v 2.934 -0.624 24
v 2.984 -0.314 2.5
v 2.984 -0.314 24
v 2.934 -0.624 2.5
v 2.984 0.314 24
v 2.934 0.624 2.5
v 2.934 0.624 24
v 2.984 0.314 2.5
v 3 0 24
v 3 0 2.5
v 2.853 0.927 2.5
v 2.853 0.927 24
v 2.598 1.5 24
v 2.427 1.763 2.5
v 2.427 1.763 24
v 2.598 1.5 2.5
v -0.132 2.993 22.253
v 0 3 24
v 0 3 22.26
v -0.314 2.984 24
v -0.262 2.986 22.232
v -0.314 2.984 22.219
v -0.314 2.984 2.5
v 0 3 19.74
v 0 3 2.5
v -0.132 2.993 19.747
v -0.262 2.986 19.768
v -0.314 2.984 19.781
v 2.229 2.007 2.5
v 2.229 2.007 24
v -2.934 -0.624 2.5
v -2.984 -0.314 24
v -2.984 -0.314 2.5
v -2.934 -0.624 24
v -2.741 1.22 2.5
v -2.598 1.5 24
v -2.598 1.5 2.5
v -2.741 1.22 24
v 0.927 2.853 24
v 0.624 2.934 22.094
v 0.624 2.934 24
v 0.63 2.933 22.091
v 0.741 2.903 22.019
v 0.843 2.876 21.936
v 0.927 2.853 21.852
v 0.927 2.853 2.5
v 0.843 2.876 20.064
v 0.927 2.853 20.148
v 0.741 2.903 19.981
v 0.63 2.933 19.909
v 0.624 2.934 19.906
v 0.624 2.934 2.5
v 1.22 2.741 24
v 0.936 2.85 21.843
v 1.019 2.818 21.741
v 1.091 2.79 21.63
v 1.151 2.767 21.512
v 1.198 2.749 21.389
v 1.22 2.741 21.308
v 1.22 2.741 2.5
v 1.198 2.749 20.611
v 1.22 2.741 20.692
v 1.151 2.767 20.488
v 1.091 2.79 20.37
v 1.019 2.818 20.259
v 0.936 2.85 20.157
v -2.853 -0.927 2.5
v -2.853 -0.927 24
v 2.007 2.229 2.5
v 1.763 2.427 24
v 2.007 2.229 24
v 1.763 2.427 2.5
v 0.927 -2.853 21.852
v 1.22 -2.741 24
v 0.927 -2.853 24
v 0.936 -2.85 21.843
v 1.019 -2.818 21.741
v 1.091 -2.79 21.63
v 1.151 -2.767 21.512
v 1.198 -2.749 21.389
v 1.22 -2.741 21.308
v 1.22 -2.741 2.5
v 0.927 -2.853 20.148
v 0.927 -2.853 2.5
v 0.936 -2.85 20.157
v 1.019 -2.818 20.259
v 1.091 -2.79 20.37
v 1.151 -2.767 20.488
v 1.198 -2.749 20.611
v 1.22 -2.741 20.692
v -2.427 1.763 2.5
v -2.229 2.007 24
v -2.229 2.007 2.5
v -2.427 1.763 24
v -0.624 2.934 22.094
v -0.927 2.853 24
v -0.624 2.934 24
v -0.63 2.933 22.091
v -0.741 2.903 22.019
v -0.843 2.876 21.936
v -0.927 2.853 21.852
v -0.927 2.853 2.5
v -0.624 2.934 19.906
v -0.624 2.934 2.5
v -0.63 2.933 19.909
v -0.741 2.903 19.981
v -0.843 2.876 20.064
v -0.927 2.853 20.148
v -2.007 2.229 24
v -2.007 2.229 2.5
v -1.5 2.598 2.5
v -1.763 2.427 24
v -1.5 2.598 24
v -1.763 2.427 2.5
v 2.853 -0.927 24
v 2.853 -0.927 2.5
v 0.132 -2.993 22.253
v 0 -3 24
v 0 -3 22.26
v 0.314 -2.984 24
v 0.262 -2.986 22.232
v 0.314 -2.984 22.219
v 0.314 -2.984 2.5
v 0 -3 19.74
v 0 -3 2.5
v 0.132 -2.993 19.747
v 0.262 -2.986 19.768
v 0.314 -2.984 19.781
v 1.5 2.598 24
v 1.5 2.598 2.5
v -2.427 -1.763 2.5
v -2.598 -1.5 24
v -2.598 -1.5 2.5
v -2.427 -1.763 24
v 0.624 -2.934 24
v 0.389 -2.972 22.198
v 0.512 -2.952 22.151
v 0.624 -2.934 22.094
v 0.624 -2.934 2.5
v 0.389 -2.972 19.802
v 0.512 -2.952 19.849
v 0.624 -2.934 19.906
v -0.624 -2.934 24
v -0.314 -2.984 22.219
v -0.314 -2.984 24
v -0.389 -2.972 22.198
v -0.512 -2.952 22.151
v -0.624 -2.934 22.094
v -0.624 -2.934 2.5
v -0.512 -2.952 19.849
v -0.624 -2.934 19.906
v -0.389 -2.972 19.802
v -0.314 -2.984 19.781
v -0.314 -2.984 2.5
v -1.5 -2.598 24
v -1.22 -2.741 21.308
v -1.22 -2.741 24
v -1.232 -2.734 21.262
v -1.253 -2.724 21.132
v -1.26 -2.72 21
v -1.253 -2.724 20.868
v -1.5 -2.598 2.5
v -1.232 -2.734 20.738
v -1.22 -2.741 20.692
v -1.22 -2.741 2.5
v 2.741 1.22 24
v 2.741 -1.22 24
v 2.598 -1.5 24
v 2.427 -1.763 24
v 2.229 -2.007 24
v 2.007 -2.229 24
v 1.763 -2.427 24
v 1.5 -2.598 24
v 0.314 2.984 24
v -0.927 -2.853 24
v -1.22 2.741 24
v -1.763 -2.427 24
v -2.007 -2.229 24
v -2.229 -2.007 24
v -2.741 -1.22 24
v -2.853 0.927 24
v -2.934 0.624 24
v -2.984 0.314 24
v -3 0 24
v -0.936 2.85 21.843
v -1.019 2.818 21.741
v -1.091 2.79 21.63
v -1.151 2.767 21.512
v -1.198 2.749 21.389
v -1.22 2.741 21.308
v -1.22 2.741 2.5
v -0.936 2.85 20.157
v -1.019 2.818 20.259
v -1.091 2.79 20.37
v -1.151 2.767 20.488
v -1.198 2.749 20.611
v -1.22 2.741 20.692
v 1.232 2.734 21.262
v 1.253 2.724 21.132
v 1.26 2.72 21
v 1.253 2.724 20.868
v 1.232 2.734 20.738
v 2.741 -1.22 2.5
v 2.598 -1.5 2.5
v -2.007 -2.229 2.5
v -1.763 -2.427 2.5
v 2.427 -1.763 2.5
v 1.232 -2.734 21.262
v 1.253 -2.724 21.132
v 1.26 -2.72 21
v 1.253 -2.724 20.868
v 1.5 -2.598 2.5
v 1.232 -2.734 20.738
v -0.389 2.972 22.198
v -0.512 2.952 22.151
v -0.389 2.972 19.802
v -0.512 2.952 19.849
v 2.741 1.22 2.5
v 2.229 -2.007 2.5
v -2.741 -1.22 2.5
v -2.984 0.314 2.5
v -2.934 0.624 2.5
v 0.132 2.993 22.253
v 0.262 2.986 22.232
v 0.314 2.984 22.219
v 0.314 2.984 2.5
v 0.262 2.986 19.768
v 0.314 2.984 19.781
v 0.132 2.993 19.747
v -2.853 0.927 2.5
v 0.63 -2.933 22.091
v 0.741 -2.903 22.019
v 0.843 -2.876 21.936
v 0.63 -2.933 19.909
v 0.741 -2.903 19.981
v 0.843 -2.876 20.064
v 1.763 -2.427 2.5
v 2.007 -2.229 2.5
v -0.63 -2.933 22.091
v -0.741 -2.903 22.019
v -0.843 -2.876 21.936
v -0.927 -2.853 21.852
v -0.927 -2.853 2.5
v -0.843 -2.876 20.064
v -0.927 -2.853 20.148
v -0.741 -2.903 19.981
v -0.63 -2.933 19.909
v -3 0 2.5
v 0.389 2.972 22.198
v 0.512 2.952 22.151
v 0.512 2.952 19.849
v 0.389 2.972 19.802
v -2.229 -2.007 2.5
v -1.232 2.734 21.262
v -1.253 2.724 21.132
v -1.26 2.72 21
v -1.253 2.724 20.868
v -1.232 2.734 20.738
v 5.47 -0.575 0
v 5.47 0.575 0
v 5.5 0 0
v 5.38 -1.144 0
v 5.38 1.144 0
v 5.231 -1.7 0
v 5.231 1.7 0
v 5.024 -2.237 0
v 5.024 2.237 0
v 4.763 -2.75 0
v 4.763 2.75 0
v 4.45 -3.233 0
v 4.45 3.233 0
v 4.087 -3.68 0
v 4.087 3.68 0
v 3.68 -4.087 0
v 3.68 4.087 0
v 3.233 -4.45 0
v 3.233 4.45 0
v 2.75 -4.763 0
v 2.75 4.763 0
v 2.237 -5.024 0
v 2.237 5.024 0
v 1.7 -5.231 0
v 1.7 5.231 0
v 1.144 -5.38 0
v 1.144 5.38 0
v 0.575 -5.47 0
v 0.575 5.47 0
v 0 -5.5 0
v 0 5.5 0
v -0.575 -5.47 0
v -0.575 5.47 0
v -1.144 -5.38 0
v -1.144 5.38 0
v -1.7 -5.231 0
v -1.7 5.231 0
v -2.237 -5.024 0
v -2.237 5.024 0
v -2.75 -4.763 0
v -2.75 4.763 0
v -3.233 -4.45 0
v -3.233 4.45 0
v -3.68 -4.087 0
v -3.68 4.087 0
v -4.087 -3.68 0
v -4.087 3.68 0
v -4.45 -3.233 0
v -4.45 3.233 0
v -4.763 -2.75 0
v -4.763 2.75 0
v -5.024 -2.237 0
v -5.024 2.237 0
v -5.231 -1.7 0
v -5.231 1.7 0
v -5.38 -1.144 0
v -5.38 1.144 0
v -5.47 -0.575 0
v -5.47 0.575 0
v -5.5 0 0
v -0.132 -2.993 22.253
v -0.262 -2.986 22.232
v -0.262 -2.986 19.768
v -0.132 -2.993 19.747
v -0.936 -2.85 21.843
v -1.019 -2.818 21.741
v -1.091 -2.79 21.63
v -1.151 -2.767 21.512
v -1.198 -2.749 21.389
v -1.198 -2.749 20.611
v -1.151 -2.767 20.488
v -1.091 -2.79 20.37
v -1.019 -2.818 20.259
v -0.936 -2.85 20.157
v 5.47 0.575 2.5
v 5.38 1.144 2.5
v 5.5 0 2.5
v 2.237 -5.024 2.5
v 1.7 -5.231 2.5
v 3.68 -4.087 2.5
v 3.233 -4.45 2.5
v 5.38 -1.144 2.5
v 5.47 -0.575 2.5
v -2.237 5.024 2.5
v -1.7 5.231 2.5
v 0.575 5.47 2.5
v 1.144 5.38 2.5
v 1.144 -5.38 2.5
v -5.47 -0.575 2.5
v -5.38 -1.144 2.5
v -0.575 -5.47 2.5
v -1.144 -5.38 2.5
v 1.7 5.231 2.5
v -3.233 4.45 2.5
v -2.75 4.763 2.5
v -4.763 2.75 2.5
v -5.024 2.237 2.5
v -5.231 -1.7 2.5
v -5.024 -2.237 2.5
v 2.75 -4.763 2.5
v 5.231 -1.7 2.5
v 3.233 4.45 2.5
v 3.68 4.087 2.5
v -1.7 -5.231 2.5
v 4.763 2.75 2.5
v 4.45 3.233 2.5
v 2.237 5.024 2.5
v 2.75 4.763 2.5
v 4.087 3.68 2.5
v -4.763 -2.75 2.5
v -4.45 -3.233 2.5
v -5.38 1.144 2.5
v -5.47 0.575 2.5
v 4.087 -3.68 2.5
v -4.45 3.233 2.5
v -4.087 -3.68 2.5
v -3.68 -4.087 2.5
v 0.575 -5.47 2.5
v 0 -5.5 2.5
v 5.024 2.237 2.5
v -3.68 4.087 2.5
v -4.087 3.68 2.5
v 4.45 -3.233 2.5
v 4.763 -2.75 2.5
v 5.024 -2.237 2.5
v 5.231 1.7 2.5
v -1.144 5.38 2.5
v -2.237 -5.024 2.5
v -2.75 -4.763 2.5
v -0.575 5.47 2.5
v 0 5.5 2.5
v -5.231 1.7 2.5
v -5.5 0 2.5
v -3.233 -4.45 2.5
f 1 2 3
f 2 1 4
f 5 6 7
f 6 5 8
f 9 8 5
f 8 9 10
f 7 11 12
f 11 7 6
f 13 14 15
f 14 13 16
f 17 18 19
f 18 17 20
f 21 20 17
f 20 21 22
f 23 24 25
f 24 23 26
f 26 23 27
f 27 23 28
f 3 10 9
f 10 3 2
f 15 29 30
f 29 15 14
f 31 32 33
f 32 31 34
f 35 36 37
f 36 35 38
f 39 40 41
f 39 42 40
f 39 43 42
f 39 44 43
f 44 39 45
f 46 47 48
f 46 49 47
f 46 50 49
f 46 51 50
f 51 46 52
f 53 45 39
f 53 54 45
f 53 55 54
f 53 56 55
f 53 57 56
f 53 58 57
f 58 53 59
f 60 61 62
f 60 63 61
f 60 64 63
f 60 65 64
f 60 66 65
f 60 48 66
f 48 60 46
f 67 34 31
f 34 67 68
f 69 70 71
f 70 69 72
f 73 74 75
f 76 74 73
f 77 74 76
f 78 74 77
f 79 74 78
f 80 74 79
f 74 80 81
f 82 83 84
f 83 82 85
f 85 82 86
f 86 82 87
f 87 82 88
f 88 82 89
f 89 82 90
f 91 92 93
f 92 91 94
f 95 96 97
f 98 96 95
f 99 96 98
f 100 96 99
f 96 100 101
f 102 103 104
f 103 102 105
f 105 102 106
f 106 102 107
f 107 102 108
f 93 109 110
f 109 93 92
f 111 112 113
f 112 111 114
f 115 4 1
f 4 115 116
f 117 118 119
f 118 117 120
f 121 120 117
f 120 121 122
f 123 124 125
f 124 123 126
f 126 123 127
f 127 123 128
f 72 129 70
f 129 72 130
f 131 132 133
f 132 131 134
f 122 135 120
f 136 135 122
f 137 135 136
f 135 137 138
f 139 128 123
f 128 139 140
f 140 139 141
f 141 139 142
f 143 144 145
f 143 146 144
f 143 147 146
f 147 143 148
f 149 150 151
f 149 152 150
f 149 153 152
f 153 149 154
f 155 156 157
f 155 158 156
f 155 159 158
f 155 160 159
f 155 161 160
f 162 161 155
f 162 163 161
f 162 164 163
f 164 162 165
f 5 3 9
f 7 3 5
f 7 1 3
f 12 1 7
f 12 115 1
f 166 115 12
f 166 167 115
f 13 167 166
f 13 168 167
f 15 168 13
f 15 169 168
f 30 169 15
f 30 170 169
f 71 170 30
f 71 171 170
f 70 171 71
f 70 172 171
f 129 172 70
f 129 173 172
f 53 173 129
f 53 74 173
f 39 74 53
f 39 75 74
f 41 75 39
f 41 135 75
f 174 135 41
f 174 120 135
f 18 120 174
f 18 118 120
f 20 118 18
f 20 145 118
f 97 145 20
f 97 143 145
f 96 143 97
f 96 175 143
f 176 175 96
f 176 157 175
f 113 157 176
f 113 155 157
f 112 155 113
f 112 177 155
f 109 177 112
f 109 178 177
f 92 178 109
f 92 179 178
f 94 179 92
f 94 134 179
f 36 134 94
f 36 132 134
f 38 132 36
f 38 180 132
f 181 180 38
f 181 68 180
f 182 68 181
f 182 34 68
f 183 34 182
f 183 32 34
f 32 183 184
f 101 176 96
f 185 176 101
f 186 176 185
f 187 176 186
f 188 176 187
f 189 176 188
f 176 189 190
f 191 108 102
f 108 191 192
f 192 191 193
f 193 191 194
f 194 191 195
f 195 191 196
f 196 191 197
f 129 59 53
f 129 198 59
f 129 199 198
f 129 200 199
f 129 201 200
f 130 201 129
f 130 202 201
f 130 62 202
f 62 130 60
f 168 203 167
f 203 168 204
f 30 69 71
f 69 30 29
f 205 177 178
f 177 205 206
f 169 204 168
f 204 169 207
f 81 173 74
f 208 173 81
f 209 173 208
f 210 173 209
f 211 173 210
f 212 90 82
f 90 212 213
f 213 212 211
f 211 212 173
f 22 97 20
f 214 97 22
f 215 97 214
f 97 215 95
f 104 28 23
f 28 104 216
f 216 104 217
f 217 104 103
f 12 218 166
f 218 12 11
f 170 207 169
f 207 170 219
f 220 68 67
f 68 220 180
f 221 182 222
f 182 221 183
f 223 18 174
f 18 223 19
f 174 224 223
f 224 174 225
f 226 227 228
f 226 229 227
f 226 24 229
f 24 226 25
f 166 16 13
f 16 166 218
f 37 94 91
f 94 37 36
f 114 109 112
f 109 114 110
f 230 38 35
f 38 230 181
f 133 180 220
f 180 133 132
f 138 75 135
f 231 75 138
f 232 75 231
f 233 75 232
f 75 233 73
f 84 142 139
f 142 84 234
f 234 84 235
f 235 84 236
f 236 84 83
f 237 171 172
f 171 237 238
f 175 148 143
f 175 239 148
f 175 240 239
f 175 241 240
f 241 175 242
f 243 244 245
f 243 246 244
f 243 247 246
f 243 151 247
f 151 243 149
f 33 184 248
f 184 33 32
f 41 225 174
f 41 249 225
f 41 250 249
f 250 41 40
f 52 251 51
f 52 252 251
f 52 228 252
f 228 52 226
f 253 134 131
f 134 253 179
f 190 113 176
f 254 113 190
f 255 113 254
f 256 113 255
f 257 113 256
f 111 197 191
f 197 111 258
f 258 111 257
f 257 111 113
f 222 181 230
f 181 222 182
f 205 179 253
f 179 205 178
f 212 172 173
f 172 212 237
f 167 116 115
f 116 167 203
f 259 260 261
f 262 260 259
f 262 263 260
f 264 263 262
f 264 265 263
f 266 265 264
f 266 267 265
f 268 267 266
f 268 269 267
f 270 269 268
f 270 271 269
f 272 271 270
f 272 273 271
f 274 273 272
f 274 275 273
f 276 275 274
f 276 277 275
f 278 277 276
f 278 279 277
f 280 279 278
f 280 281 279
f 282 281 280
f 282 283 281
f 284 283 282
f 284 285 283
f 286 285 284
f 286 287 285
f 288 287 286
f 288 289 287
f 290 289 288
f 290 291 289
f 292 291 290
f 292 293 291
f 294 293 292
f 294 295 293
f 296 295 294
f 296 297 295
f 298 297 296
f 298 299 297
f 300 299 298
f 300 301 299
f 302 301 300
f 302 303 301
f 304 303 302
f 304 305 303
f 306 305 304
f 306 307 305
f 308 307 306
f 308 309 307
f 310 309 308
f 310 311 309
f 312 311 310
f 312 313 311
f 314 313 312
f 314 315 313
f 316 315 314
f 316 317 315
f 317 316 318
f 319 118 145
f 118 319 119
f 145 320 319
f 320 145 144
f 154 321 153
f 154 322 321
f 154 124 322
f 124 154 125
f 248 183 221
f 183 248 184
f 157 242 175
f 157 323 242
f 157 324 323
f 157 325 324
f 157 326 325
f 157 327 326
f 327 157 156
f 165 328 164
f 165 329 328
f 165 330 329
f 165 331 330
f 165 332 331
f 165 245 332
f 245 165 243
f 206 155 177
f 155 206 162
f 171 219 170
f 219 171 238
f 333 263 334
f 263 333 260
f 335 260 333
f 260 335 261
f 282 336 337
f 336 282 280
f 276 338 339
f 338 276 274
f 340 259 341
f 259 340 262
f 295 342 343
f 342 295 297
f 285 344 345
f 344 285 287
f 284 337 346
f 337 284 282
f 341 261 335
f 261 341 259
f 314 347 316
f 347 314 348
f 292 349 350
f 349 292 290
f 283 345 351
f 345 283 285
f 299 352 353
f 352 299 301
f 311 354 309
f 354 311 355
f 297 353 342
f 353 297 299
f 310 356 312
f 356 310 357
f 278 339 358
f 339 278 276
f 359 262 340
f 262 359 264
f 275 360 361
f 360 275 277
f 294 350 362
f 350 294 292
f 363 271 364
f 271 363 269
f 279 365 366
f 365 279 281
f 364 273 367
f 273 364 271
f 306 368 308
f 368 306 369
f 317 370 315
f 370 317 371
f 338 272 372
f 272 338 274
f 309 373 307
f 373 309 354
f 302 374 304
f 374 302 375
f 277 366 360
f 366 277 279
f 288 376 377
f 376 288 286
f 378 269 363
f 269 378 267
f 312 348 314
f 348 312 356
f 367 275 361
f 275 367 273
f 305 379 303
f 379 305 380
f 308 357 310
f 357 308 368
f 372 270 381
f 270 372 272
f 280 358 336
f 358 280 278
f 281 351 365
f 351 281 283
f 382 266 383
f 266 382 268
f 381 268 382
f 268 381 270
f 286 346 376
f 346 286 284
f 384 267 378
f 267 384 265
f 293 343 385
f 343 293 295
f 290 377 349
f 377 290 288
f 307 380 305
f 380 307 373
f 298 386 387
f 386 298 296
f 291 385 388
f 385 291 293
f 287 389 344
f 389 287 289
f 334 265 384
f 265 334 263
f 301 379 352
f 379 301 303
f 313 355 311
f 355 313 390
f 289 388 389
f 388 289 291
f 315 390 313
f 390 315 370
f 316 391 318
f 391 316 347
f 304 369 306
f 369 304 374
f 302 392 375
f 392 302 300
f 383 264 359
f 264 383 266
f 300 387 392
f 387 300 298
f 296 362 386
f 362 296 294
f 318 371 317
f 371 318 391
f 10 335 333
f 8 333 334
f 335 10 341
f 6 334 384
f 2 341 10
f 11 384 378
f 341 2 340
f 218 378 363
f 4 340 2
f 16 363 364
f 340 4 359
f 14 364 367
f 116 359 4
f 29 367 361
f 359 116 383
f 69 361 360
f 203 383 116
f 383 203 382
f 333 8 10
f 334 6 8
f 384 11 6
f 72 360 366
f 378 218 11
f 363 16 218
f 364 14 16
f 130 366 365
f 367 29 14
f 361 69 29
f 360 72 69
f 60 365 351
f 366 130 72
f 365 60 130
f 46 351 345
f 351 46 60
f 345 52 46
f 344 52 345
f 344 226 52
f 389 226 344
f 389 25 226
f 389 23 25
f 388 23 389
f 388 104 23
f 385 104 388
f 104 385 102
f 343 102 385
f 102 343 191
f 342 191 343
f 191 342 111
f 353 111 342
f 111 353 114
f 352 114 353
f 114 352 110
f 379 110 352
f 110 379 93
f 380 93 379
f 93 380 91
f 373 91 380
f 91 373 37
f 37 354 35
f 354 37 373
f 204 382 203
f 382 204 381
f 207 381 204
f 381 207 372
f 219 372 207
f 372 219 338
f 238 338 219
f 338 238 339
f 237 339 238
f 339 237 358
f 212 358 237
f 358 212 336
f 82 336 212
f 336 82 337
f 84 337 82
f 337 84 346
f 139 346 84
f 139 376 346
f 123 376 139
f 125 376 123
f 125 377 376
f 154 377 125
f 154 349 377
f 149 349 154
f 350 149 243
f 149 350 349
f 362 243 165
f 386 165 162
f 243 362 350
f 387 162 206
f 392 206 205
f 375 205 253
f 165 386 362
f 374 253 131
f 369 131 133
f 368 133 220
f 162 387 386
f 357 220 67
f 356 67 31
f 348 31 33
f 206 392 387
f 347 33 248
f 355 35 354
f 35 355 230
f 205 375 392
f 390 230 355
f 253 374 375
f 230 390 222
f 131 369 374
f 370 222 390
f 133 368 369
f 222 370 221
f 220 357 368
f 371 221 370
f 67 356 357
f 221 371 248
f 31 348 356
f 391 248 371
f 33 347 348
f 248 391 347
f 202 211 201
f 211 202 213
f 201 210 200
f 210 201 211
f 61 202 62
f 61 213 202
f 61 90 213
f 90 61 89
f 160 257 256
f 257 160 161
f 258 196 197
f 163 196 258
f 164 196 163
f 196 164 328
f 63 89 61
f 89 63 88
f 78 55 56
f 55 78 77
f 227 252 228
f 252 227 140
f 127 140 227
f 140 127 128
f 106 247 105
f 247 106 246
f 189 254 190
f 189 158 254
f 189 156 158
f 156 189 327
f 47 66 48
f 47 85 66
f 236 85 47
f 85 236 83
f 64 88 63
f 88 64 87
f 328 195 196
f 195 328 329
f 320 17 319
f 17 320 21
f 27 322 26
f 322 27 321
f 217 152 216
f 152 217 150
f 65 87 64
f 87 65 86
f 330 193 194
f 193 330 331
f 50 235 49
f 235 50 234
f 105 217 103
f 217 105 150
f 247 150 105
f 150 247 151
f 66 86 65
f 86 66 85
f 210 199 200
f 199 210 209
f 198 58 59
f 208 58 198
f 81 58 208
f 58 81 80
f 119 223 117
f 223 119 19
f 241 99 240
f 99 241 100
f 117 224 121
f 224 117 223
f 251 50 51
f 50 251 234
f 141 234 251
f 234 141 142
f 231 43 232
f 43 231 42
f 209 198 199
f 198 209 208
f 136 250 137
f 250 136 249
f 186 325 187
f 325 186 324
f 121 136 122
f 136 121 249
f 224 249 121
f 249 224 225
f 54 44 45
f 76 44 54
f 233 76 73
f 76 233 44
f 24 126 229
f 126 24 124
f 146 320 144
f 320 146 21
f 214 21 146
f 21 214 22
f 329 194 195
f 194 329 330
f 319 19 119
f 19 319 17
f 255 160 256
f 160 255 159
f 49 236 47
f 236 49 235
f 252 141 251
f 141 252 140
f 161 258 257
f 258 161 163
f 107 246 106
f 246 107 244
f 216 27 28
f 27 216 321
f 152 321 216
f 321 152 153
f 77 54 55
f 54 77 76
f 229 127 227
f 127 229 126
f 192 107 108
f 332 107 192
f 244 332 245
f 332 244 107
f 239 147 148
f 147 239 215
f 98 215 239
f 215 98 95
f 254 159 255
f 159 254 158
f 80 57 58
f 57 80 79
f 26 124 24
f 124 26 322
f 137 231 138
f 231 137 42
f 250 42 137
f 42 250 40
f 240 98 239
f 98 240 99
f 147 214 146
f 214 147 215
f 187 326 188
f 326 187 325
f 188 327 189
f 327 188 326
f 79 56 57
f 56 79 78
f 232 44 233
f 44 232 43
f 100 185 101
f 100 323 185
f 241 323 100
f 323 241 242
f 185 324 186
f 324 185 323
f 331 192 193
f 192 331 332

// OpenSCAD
// Clevis pin with cross-hole.
$fn = 60;
eps = 0.02;
pin_d = 6;
pin_l = 24;
head_d = pin_d + 5;
difference() {
    union() { cylinder(d=pin_d,h=pin_l); cylinder(d=head_d,h=2.5); }
    translate([0,-pin_d-eps,pin_l-3]) rotate([-90,0,0]) cylinder(d=pin_d*0.42,h=2*pin_d+2*eps);
}
